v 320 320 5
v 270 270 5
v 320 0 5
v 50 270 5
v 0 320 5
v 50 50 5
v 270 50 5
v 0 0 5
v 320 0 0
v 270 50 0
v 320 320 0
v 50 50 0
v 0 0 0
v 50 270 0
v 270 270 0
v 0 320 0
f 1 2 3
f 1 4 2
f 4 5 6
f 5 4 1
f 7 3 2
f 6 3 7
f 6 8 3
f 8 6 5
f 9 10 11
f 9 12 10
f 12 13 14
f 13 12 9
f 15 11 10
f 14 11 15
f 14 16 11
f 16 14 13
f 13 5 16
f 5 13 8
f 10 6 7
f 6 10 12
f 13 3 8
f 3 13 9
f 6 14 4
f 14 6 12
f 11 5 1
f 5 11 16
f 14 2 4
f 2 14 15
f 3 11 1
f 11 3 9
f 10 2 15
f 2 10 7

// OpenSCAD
cube([280,50,5]);
cube([50,280,5]);
translate([0,270,00]){
    cube([280,50,5]);
}


translate([270,0,0]){
    cube([50,320,5]);
}
